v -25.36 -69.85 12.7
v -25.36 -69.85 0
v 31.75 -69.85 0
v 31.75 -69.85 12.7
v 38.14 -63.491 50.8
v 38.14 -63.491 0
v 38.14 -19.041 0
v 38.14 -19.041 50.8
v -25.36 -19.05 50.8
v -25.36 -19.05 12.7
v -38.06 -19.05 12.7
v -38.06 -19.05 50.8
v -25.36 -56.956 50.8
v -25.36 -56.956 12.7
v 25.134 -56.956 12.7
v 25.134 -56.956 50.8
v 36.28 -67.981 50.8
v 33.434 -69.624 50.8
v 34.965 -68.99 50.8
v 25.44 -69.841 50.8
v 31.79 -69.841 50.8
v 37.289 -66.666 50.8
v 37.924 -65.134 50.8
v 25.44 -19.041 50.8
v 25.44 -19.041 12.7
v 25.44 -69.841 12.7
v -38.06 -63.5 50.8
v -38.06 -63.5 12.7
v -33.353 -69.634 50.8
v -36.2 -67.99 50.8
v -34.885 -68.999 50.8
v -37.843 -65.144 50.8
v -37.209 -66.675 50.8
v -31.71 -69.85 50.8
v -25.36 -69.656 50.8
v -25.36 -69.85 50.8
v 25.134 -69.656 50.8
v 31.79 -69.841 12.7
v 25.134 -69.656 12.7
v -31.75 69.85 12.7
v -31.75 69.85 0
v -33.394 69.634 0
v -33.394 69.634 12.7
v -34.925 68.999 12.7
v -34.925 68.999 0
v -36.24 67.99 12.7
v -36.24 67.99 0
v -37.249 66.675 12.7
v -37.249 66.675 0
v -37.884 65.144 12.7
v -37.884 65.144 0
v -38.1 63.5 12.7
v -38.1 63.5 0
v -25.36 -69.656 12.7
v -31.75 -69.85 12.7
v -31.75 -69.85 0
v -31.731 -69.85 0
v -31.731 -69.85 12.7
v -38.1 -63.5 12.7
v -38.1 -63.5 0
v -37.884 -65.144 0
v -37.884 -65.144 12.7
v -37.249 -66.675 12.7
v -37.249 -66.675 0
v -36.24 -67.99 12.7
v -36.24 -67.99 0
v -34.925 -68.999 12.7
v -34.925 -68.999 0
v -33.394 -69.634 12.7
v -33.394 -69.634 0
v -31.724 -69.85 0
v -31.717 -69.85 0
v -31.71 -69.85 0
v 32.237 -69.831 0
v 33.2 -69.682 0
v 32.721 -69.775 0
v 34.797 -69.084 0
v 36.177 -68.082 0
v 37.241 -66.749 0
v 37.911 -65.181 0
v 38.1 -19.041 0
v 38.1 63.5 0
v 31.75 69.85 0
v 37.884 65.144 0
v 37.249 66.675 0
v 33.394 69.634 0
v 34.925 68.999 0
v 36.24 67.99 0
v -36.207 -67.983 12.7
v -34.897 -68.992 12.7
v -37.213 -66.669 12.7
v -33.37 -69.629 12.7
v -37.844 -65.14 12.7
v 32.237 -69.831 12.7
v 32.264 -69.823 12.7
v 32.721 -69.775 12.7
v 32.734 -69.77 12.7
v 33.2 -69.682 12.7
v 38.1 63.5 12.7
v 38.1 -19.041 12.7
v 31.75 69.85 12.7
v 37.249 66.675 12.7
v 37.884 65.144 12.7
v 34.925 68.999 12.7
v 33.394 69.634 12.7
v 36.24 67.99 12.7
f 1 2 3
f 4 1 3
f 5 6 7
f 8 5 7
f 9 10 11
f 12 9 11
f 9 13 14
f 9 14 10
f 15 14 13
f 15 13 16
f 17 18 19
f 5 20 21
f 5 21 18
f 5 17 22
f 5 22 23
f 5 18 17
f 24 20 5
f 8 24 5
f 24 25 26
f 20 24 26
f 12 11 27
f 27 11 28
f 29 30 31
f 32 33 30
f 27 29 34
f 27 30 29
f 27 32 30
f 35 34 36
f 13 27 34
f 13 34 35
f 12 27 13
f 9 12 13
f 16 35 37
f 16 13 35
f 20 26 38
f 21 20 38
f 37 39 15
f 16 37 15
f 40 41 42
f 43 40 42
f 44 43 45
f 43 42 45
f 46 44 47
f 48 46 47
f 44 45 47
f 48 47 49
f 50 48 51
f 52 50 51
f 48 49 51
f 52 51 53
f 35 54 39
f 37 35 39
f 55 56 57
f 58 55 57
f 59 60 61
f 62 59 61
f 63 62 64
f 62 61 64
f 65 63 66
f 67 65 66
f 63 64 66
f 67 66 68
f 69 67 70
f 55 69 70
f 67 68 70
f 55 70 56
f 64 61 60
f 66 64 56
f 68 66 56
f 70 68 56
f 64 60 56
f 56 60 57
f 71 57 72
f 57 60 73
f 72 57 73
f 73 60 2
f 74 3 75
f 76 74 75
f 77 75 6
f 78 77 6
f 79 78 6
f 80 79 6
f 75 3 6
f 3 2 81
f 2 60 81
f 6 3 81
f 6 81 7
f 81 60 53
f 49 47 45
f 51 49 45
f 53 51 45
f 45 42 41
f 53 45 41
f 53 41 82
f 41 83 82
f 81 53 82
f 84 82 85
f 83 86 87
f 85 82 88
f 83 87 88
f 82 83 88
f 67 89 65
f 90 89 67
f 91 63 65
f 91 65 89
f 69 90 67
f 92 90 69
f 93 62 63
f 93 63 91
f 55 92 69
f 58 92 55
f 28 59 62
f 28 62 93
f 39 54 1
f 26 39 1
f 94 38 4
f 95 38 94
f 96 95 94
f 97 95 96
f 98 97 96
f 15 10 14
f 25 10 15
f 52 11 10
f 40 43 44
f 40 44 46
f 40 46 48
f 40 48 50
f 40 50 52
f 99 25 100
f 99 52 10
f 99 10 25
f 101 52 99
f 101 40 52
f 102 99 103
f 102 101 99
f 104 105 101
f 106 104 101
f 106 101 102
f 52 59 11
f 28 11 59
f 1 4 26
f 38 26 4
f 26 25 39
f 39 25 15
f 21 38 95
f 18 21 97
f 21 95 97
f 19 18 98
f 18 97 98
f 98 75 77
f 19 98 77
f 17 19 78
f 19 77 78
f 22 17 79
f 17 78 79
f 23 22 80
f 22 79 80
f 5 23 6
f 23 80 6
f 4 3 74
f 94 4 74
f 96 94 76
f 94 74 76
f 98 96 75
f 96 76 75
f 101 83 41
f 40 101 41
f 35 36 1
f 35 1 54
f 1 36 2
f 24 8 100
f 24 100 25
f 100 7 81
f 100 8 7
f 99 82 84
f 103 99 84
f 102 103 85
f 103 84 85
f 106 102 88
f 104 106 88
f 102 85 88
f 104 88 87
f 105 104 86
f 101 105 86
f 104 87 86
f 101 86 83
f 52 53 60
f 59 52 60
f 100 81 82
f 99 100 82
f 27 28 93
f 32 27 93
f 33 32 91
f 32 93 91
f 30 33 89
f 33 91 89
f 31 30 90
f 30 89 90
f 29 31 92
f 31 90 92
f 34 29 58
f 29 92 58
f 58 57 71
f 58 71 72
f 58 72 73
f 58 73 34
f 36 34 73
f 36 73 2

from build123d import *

# Parameters (mm, degrees)
F1_DEPTH = 12.7
F3_DEPTH = 50.8
F4_W     = 50.8
F4_H     = 12.7
F5_DEPTH = 50.8


with BuildPart() as f1:
    # F0 (on Top) → F1 (new body)
    with BuildSketch(Plane.XY):
        with BuildLine():
            ThreePointArc((38.1, 63.5), (36.240128, 67.990128), (31.75, 69.85))
            Line((31.75, 69.85), (-31.75, 69.85))
            ThreePointArc((-31.75, 69.85), (-36.240128, 67.990128), (-38.1, 63.5))
            Line((-38.1, 63.5), (-38.1, -63.5))
            ThreePointArc((-38.1, -63.5), (-36.240128, -67.990128), (-31.75, -69.85))
            Line((-31.75, -69.85), (31.75, -69.85))
            ThreePointArc((31.75, -69.85), (36.240128, -67.990128), (38.1, -63.5))
            Line((38.1, -63.5), (38.1, 63.5))
        make_face()
    extrude(amount=F1_DEPTH)

    # F2 (on Top) → F3 (join)
    with BuildSketch(Plane.XY):
        with BuildLine():
            Line((-25.359782, -19.050035), (-38.059782, -19.050035))
            Line((-38.059782, -19.050035), (-38.059782, -63.500035))
            ThreePointArc((-38.059782, -63.500035), (-36.19991, -67.990163), (-31.709782, -69.850035))
            Line((-31.709782, -69.850035), (-25.359782, -69.850035))
            Line((-25.359782, -69.850035), (-25.359782, -19.050035))
        make_face()
        with BuildLine():
            Line((38.140218, -19.040707), (25.440218, -19.040707))
            Line((25.440218, -19.040707), (25.440218, -69.840707))
            Line((25.440218, -69.840707), (31.790218, -69.840707))
            ThreePointArc((31.790218, -69.840707), (36.280346, -67.980835), (38.140218, -63.490707))
            Line((38.140218, -63.490707), (38.140218, -19.040707))
        make_face()
    extrude(amount=F3_DEPTH)

    # F4 (on Top) → F5 (join)
    with BuildSketch(Plane.XY):
        with Locations((-0.266136, -63.306491)):
            Rectangle(F4_W, F4_H)
    extrude(amount=F5_DEPTH)


solid = f1.part
